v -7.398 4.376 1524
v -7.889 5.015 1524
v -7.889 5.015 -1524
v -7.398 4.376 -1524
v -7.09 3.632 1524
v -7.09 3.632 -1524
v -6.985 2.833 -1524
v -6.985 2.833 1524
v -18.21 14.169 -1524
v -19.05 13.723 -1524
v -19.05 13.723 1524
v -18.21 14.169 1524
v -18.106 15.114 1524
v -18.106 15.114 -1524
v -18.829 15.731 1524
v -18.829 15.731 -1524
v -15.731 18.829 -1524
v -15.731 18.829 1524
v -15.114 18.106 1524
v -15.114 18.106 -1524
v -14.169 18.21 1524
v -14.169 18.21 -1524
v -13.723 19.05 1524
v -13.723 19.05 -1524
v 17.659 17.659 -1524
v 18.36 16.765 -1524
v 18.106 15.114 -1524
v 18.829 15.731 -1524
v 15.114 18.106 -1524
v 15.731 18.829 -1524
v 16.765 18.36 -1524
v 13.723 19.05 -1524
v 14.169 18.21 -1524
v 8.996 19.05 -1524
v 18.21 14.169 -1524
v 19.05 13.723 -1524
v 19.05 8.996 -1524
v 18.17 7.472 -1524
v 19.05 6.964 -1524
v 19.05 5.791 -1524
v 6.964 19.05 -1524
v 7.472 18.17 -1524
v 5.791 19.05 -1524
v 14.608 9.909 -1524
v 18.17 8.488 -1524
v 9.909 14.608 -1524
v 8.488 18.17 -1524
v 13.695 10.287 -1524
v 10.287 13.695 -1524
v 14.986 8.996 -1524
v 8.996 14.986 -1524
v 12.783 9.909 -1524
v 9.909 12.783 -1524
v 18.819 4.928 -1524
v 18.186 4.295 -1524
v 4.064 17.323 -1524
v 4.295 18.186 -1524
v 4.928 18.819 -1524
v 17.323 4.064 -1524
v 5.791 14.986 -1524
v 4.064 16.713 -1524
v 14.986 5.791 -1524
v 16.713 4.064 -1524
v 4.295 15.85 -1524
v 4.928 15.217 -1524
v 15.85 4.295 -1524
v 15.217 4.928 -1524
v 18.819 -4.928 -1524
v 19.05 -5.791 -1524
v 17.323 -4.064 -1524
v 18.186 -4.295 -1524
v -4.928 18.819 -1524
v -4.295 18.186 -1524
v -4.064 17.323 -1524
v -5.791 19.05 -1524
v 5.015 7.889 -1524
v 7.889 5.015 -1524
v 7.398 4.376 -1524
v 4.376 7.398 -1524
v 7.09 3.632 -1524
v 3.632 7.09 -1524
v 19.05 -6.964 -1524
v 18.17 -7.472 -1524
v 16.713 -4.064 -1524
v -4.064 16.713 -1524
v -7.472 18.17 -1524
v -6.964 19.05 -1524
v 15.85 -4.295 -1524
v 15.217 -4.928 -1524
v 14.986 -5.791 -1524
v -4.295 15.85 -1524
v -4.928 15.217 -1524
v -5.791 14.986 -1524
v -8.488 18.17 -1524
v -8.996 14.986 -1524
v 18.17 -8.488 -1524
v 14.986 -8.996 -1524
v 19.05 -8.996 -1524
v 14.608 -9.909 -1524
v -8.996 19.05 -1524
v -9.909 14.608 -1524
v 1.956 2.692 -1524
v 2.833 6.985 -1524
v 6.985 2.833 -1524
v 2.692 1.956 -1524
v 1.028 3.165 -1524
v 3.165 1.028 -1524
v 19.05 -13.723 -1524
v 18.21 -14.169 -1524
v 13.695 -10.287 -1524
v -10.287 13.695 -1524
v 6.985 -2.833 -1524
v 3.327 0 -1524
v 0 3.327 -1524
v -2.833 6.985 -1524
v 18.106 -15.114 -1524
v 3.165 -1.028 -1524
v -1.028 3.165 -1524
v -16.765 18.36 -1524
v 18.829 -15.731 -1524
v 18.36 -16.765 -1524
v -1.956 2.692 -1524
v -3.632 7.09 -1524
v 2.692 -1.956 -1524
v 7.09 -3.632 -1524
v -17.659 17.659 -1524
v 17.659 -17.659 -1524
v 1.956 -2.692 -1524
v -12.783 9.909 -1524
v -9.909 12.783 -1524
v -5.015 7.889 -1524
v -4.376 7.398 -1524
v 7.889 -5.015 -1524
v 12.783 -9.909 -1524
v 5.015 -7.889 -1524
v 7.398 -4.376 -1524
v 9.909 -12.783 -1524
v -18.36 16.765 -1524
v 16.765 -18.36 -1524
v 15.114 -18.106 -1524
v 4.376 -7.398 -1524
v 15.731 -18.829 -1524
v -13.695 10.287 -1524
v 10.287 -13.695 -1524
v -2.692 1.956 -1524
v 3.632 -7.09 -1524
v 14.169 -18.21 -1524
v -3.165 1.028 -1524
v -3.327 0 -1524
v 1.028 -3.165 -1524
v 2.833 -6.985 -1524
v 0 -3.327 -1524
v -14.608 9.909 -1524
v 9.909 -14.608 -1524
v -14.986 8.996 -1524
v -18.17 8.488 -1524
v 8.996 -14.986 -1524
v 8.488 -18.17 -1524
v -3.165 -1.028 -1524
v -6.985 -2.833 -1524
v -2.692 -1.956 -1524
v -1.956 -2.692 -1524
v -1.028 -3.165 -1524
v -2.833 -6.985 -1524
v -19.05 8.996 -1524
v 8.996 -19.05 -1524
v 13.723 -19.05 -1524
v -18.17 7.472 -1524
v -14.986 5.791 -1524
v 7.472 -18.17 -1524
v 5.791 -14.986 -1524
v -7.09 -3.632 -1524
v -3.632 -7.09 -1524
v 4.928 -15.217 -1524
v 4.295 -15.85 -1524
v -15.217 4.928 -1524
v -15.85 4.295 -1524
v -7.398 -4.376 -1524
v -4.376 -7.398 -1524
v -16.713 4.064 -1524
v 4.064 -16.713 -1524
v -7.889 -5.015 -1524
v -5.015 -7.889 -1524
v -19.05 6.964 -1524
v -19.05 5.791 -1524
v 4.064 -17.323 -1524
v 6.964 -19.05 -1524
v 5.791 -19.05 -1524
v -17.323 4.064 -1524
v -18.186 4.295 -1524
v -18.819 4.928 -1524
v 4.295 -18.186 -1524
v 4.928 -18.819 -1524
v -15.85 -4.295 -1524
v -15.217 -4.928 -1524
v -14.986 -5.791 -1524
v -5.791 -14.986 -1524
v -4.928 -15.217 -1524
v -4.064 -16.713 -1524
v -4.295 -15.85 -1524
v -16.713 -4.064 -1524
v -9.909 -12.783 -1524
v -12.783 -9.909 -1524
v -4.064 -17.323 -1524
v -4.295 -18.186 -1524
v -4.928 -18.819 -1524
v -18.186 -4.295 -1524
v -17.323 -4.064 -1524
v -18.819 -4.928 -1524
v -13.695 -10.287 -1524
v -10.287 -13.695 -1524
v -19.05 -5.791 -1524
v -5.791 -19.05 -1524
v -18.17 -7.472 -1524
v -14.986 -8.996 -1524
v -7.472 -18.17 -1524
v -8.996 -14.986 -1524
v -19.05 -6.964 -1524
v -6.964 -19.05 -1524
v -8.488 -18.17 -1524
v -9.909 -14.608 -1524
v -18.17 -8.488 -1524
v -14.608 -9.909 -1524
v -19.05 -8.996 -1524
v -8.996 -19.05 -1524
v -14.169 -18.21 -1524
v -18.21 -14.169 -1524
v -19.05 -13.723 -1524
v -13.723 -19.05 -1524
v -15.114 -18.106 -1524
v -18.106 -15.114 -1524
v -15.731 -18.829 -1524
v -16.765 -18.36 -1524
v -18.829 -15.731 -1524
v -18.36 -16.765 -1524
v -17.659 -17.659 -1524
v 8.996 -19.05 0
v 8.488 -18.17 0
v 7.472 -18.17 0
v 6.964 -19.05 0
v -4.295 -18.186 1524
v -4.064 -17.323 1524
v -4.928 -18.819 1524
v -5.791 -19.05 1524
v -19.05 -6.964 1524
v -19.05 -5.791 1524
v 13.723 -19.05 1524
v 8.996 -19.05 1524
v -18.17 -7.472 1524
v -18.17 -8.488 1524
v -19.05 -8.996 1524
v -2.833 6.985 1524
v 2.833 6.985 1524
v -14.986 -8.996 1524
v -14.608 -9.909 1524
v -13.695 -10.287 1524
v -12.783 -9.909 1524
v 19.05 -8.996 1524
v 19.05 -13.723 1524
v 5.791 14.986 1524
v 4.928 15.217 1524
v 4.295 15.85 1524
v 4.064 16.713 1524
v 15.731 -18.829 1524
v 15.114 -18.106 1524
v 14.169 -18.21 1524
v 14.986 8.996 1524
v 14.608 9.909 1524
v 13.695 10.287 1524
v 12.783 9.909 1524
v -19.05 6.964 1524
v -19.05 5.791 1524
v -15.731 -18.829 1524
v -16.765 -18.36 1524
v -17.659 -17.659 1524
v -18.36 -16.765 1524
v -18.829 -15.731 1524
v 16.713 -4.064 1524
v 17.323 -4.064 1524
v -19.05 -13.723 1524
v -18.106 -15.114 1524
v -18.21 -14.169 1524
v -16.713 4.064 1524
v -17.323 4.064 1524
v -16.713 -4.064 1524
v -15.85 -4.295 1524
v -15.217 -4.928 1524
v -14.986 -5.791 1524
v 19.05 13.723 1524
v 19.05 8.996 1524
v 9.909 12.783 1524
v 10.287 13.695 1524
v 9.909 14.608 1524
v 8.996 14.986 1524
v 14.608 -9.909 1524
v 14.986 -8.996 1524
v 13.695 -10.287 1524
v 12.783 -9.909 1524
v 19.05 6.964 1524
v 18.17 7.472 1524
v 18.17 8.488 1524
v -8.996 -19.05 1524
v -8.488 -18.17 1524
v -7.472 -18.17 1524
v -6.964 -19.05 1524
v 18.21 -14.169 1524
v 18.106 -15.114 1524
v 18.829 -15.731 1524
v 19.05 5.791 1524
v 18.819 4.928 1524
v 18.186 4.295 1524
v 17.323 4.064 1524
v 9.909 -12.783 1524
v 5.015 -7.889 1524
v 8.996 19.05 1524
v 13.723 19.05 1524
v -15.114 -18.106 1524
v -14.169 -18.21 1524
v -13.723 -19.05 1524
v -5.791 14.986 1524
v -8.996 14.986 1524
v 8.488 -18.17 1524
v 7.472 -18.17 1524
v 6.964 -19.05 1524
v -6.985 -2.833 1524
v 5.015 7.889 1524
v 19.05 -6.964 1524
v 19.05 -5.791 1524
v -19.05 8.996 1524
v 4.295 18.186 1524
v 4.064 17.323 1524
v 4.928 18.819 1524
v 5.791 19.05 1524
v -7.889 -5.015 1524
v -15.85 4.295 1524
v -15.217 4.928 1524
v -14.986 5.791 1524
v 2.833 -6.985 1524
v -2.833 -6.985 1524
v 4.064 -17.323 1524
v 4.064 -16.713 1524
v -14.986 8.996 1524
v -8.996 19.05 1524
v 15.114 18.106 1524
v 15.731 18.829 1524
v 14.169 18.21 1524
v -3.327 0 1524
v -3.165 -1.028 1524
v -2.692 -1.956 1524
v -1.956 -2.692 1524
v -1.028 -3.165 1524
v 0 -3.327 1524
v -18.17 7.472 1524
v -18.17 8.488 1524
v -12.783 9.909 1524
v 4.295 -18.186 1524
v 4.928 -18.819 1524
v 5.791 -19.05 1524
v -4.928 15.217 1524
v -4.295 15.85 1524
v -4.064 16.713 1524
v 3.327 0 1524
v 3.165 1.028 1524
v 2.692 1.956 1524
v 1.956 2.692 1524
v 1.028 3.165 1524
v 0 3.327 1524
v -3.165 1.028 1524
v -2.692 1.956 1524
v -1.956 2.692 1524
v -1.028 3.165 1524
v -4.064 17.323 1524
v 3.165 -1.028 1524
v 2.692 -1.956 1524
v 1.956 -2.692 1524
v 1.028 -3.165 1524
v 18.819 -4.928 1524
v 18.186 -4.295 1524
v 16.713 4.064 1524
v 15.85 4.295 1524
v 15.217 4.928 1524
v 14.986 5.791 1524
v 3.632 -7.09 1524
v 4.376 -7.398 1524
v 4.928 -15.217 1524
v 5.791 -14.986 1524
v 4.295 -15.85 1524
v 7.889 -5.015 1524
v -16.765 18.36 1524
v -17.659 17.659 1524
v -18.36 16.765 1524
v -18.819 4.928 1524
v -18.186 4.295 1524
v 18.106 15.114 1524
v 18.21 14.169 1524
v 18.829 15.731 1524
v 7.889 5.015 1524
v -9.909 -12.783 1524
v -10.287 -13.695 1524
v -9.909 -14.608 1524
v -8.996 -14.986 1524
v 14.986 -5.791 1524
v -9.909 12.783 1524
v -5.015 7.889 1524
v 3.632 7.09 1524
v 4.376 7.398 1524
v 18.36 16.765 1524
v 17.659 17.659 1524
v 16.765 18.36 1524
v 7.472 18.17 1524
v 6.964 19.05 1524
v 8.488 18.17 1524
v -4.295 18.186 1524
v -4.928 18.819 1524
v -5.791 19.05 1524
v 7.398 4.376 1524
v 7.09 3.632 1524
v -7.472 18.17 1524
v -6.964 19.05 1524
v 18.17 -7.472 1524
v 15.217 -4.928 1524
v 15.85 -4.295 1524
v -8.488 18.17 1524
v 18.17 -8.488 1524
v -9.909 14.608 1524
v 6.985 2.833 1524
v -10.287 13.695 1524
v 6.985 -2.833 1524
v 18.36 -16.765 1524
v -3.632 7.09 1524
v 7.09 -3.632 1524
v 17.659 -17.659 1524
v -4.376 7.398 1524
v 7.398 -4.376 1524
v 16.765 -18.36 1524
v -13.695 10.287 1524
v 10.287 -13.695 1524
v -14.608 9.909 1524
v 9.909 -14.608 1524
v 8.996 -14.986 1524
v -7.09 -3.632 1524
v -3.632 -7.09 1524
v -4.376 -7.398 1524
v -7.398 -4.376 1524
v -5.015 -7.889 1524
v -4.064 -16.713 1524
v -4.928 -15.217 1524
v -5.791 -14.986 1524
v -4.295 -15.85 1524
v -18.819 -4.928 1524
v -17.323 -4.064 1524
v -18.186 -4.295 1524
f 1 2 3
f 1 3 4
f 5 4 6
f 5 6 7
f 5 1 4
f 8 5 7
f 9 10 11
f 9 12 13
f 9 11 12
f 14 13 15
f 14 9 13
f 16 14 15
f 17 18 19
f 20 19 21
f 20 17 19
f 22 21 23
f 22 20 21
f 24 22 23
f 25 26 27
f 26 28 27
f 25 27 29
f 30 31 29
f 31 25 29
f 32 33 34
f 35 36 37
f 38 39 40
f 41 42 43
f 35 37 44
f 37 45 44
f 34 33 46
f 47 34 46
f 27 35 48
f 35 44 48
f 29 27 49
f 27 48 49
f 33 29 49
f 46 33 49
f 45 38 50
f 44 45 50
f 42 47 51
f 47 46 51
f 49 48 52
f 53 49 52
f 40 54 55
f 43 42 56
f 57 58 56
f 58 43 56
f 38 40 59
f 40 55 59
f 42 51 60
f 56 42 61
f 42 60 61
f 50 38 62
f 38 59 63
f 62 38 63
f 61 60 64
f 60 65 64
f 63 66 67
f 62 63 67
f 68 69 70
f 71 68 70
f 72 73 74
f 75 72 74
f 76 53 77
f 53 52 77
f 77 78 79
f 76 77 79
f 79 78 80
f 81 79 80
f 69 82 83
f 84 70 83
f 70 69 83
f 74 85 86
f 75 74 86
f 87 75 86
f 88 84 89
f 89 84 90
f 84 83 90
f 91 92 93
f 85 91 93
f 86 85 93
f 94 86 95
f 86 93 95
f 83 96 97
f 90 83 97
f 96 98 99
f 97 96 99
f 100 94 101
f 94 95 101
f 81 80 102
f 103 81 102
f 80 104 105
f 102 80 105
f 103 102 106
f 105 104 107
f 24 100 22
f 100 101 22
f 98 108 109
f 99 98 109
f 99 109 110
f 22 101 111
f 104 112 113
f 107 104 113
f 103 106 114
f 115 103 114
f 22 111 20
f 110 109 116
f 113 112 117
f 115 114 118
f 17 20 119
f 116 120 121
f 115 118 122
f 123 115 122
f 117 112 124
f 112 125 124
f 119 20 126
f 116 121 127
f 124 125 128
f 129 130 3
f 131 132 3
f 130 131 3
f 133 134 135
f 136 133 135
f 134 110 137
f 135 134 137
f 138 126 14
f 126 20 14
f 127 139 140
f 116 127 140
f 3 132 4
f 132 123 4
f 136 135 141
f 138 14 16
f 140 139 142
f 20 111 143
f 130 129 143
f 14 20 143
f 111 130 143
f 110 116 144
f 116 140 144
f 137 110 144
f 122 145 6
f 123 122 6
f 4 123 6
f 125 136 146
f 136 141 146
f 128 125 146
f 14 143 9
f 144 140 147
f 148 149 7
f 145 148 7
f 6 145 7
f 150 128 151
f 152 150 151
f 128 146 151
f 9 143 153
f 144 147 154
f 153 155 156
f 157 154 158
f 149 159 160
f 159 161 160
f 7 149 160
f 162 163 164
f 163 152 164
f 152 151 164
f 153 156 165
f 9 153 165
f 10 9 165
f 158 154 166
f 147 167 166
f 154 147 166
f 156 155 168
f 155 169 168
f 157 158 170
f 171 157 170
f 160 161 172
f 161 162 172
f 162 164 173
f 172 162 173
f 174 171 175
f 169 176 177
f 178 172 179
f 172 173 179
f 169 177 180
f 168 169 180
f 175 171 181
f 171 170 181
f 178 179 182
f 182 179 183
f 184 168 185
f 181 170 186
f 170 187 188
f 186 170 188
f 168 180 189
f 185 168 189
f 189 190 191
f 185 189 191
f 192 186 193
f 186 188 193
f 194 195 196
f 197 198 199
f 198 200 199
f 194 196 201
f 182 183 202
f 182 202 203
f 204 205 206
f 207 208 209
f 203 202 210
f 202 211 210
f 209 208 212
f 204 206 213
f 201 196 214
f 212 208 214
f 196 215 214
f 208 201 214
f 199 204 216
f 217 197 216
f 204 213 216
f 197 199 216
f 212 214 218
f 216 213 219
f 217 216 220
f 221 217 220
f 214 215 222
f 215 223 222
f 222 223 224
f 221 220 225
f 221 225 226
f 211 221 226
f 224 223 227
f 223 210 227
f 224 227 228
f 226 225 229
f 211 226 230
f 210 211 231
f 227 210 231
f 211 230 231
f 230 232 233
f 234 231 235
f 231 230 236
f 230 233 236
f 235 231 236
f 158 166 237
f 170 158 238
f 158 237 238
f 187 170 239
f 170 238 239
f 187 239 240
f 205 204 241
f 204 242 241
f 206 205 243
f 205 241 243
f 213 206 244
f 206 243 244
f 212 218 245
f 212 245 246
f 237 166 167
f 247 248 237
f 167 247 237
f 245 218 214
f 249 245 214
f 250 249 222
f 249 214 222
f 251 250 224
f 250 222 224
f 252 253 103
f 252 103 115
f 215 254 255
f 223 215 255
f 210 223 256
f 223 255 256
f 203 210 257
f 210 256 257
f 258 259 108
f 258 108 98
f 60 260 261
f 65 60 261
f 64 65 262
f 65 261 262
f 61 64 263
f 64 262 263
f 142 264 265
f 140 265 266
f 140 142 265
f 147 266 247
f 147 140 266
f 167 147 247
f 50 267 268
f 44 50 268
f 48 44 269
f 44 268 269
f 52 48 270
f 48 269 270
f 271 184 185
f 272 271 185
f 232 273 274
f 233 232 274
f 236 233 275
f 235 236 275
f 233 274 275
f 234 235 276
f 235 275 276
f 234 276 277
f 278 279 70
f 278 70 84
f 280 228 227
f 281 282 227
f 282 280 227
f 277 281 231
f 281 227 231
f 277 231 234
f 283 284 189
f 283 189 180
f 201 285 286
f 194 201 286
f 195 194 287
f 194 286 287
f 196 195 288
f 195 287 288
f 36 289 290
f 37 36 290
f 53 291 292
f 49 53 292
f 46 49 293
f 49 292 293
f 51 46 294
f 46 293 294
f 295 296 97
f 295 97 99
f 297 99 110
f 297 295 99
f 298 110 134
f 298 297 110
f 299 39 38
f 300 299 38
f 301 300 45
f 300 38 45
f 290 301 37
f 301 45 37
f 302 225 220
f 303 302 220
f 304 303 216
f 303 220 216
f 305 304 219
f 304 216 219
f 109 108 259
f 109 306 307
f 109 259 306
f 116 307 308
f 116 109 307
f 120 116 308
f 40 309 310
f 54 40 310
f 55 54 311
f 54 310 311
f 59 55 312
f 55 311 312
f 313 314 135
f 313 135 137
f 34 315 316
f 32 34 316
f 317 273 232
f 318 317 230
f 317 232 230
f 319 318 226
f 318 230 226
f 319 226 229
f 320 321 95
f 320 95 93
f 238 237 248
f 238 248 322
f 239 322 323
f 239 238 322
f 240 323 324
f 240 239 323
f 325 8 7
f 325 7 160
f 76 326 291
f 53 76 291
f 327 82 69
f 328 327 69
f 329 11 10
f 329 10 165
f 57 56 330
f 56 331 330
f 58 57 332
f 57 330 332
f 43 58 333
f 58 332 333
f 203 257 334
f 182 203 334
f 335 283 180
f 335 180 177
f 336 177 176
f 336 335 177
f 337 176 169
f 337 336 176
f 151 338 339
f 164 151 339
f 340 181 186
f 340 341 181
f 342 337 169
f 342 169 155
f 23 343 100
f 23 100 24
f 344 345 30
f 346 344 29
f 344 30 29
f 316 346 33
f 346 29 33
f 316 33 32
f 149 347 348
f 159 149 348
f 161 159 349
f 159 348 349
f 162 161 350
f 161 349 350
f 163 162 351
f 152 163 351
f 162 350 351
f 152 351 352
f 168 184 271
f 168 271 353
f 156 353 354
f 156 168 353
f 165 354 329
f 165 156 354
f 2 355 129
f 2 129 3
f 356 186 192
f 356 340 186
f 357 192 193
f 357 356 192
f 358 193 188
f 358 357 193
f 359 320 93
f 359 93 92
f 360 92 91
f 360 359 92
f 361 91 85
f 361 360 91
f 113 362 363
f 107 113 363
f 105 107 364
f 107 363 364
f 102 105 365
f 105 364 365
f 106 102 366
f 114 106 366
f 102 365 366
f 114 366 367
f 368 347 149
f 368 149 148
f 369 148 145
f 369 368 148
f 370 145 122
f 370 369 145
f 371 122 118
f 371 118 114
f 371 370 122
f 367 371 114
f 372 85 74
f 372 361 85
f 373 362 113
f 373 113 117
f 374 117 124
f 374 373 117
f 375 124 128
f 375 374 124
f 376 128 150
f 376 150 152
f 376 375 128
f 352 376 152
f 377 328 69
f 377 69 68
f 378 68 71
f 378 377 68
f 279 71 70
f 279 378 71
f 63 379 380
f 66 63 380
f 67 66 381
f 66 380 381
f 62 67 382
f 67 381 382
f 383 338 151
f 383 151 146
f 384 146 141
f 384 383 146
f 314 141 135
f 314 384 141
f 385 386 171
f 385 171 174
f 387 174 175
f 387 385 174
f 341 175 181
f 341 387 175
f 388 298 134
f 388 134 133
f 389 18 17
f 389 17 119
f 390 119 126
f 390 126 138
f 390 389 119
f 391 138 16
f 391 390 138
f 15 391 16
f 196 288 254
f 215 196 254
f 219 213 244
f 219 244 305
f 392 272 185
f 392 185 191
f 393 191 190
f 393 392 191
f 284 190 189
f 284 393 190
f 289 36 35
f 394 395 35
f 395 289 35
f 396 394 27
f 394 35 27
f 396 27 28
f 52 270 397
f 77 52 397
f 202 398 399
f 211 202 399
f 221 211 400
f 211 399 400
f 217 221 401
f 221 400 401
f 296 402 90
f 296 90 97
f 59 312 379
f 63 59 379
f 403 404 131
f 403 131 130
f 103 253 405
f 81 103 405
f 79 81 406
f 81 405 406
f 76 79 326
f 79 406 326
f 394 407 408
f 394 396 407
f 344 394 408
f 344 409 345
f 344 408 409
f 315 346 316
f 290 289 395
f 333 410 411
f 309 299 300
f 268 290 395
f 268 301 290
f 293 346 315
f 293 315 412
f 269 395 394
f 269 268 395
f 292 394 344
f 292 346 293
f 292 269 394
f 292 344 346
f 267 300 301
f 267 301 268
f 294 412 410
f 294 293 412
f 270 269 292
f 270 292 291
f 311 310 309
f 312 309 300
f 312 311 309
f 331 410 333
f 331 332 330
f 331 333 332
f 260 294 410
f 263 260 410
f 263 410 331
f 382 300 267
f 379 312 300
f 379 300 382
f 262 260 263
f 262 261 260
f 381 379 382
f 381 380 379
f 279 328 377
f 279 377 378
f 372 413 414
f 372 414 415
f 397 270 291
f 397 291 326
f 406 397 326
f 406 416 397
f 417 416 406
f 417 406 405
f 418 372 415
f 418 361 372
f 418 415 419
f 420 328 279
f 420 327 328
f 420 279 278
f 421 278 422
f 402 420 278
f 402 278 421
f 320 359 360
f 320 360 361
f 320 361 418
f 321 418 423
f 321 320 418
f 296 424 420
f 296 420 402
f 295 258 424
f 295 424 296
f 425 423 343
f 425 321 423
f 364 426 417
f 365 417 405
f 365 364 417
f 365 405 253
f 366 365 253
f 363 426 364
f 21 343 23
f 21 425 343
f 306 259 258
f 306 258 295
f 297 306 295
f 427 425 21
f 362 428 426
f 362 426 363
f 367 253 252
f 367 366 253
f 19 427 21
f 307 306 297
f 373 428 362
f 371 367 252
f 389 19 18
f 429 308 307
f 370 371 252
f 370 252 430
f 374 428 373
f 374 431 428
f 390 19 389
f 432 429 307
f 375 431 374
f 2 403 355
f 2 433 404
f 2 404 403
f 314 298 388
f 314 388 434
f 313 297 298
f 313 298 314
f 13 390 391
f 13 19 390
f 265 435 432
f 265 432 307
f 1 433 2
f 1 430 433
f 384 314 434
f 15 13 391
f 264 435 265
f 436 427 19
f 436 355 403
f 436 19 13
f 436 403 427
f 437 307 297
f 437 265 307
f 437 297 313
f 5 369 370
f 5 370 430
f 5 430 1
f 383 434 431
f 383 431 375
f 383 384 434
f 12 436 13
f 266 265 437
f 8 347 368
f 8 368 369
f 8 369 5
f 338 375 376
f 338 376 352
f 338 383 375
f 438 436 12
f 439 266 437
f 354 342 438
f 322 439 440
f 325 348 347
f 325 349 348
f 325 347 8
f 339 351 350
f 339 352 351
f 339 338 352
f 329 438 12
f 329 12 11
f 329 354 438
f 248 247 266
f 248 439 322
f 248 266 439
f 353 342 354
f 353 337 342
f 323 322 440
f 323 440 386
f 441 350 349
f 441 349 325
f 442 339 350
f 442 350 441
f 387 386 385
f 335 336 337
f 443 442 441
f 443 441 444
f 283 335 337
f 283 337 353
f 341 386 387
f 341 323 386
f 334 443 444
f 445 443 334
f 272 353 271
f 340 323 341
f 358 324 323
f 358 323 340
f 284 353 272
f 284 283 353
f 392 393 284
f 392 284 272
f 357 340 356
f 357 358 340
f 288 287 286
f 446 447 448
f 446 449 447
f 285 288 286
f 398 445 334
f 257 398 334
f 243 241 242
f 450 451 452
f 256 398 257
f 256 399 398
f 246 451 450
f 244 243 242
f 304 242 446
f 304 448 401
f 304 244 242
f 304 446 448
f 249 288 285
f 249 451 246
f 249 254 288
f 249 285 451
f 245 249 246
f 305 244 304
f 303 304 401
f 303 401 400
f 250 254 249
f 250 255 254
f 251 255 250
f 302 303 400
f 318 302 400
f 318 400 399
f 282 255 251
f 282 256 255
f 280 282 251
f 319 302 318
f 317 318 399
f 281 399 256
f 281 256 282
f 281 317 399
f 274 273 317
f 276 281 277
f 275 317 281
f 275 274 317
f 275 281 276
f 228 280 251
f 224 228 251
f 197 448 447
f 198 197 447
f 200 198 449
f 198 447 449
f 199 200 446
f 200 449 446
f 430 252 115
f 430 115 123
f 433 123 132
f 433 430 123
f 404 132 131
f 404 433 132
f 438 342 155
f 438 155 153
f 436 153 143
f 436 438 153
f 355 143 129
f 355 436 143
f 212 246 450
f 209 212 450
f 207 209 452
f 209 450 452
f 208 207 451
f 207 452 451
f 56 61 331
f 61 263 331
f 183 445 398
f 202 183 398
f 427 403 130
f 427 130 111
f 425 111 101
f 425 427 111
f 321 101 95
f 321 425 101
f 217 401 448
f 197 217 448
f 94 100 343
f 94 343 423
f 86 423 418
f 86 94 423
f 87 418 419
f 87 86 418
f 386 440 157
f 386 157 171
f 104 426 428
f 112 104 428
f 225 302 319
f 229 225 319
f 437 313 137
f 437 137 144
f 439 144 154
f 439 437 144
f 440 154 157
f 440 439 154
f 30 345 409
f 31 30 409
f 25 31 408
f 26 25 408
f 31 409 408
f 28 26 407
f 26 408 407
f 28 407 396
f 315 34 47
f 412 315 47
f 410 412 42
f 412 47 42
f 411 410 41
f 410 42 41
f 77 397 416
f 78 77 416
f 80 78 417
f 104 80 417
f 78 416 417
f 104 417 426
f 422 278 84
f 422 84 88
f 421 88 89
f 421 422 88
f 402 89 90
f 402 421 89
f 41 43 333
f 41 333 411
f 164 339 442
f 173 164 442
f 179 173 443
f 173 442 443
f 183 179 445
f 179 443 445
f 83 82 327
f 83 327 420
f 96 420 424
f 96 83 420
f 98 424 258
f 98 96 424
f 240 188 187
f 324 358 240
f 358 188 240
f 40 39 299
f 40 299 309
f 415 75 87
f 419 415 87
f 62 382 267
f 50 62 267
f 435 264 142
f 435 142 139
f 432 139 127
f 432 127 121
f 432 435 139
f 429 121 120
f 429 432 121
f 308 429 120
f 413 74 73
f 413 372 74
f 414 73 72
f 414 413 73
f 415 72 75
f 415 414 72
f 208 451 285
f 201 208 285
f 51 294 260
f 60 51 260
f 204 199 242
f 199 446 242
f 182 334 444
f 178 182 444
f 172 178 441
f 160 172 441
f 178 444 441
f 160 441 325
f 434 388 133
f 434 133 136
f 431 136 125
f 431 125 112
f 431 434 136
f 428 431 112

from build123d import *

# Parameters (mm, degrees)
BOSS_EXTRUDE1_DEPTH     = 1524
SKETCH5_R               = 1.016
CUT_EXTRUDE1_DEPTH      = 1525
CUT_EXTRUDE1_DEPTH_BACK = 1525


with BuildPart() as part:
    # Sketch4 → Boss-Extrude1 (new body, symmetric)
    with BuildSketch(Plane.XY):
        with BuildLine():
            Line((5.7912, -19.05), (14.3002, -19.05))
            ThreePointArc((14.3002, -19.05), (17.658815789, -17.658815789), (19.05, -14.3002))
            Line((19.05, -14.3002), (19.05, -5.7912))
            ThreePointArc((19.05, -5.7912), (18.544114832, -4.569885168), (17.3228, -4.064))
            Line((17.3228, -4.064), (16.7132, -4.064))
            ThreePointArc((16.7132, -4.064), (15.491885168, -4.569885168), (14.986, -5.7912))
            Line((14.986, -5.7912), (14.986, -8.996305235))
            ThreePointArc((14.986, -8.996305235), (14.189232738, -10.188751711), (12.782646215, -9.908964256))
            Line((12.782646215, -9.908964256), (7.888897763, -5.015215804))
            ThreePointArc((7.888897763, -5.015215804), (7.219915375, -4.014012907), (6.985, -2.833013566))
            Line((6.985, -2.833013566), (6.985, 0))
            Line((6.985, 0), (3.3274, 0))
            ThreePointArc((3.3274, 0), (2.352827104, -2.352827104), (0, -3.3274))
            Line((0, -3.3274), (0, -6.985))
            Line((0, -6.985), (2.833013566, -6.985))
            ThreePointArc((2.833013566, -6.985), (4.014012907, -7.219915375), (5.015215804, -7.888897763))
            Line((5.015215804, -7.888897763), (9.908964256, -12.782646215))
            ThreePointArc((9.908964256, -12.782646215), (10.188751711, -14.189232738), (8.996305235, -14.986))
            Line((8.996305235, -14.986), (5.7912, -14.986))
            ThreePointArc((5.7912, -14.986), (4.569885168, -15.491885168), (4.064, -16.7132))
            Line((4.064, -16.7132), (4.064, -17.3228))
            ThreePointArc((4.064, -17.3228), (4.569885168, -18.544114832), (5.7912, -19.05))
        make_face()
    extrude(amount=BOSS_EXTRUDE1_DEPTH, both=True)

    # Sketch5 → Cut-Extrude1 (cut, two sides)
    with BuildSketch(Plane.XY) as cut_extrude1_sk:
        with Locations((14.739477062, -19.05)):
            Circle(SKETCH5_R)
        with Locations((7.980305235, -19.05)):
            Circle(SKETCH5_R)
        with Locations((19.05, -14.739477062)):
            Circle(SKETCH5_R)
        with Locations((19.05, -7.980305235)):
            Circle(SKETCH5_R)
    extrude(amount=CUT_EXTRUDE1_DEPTH, mode=Mode.SUBTRACT)
    extrude(cut_extrude1_sk.sketch, amount=-CUT_EXTRUDE1_DEPTH_BACK, mode=Mode.SUBTRACT)

    # Mirror1: part across plane


with BuildPart() as part_1:
    add(part.part)
    add(part.part.mirror(Plane(origin=(0, 0, 0), x_dir=(0, 0, 1), z_dir=(1, 0, 0))))

    # Mirror2: part across plane


with BuildPart() as part_2:
    add(part_1.part)
    add(part_1.part.mirror(Plane.ZX))


solid = part_2.part
